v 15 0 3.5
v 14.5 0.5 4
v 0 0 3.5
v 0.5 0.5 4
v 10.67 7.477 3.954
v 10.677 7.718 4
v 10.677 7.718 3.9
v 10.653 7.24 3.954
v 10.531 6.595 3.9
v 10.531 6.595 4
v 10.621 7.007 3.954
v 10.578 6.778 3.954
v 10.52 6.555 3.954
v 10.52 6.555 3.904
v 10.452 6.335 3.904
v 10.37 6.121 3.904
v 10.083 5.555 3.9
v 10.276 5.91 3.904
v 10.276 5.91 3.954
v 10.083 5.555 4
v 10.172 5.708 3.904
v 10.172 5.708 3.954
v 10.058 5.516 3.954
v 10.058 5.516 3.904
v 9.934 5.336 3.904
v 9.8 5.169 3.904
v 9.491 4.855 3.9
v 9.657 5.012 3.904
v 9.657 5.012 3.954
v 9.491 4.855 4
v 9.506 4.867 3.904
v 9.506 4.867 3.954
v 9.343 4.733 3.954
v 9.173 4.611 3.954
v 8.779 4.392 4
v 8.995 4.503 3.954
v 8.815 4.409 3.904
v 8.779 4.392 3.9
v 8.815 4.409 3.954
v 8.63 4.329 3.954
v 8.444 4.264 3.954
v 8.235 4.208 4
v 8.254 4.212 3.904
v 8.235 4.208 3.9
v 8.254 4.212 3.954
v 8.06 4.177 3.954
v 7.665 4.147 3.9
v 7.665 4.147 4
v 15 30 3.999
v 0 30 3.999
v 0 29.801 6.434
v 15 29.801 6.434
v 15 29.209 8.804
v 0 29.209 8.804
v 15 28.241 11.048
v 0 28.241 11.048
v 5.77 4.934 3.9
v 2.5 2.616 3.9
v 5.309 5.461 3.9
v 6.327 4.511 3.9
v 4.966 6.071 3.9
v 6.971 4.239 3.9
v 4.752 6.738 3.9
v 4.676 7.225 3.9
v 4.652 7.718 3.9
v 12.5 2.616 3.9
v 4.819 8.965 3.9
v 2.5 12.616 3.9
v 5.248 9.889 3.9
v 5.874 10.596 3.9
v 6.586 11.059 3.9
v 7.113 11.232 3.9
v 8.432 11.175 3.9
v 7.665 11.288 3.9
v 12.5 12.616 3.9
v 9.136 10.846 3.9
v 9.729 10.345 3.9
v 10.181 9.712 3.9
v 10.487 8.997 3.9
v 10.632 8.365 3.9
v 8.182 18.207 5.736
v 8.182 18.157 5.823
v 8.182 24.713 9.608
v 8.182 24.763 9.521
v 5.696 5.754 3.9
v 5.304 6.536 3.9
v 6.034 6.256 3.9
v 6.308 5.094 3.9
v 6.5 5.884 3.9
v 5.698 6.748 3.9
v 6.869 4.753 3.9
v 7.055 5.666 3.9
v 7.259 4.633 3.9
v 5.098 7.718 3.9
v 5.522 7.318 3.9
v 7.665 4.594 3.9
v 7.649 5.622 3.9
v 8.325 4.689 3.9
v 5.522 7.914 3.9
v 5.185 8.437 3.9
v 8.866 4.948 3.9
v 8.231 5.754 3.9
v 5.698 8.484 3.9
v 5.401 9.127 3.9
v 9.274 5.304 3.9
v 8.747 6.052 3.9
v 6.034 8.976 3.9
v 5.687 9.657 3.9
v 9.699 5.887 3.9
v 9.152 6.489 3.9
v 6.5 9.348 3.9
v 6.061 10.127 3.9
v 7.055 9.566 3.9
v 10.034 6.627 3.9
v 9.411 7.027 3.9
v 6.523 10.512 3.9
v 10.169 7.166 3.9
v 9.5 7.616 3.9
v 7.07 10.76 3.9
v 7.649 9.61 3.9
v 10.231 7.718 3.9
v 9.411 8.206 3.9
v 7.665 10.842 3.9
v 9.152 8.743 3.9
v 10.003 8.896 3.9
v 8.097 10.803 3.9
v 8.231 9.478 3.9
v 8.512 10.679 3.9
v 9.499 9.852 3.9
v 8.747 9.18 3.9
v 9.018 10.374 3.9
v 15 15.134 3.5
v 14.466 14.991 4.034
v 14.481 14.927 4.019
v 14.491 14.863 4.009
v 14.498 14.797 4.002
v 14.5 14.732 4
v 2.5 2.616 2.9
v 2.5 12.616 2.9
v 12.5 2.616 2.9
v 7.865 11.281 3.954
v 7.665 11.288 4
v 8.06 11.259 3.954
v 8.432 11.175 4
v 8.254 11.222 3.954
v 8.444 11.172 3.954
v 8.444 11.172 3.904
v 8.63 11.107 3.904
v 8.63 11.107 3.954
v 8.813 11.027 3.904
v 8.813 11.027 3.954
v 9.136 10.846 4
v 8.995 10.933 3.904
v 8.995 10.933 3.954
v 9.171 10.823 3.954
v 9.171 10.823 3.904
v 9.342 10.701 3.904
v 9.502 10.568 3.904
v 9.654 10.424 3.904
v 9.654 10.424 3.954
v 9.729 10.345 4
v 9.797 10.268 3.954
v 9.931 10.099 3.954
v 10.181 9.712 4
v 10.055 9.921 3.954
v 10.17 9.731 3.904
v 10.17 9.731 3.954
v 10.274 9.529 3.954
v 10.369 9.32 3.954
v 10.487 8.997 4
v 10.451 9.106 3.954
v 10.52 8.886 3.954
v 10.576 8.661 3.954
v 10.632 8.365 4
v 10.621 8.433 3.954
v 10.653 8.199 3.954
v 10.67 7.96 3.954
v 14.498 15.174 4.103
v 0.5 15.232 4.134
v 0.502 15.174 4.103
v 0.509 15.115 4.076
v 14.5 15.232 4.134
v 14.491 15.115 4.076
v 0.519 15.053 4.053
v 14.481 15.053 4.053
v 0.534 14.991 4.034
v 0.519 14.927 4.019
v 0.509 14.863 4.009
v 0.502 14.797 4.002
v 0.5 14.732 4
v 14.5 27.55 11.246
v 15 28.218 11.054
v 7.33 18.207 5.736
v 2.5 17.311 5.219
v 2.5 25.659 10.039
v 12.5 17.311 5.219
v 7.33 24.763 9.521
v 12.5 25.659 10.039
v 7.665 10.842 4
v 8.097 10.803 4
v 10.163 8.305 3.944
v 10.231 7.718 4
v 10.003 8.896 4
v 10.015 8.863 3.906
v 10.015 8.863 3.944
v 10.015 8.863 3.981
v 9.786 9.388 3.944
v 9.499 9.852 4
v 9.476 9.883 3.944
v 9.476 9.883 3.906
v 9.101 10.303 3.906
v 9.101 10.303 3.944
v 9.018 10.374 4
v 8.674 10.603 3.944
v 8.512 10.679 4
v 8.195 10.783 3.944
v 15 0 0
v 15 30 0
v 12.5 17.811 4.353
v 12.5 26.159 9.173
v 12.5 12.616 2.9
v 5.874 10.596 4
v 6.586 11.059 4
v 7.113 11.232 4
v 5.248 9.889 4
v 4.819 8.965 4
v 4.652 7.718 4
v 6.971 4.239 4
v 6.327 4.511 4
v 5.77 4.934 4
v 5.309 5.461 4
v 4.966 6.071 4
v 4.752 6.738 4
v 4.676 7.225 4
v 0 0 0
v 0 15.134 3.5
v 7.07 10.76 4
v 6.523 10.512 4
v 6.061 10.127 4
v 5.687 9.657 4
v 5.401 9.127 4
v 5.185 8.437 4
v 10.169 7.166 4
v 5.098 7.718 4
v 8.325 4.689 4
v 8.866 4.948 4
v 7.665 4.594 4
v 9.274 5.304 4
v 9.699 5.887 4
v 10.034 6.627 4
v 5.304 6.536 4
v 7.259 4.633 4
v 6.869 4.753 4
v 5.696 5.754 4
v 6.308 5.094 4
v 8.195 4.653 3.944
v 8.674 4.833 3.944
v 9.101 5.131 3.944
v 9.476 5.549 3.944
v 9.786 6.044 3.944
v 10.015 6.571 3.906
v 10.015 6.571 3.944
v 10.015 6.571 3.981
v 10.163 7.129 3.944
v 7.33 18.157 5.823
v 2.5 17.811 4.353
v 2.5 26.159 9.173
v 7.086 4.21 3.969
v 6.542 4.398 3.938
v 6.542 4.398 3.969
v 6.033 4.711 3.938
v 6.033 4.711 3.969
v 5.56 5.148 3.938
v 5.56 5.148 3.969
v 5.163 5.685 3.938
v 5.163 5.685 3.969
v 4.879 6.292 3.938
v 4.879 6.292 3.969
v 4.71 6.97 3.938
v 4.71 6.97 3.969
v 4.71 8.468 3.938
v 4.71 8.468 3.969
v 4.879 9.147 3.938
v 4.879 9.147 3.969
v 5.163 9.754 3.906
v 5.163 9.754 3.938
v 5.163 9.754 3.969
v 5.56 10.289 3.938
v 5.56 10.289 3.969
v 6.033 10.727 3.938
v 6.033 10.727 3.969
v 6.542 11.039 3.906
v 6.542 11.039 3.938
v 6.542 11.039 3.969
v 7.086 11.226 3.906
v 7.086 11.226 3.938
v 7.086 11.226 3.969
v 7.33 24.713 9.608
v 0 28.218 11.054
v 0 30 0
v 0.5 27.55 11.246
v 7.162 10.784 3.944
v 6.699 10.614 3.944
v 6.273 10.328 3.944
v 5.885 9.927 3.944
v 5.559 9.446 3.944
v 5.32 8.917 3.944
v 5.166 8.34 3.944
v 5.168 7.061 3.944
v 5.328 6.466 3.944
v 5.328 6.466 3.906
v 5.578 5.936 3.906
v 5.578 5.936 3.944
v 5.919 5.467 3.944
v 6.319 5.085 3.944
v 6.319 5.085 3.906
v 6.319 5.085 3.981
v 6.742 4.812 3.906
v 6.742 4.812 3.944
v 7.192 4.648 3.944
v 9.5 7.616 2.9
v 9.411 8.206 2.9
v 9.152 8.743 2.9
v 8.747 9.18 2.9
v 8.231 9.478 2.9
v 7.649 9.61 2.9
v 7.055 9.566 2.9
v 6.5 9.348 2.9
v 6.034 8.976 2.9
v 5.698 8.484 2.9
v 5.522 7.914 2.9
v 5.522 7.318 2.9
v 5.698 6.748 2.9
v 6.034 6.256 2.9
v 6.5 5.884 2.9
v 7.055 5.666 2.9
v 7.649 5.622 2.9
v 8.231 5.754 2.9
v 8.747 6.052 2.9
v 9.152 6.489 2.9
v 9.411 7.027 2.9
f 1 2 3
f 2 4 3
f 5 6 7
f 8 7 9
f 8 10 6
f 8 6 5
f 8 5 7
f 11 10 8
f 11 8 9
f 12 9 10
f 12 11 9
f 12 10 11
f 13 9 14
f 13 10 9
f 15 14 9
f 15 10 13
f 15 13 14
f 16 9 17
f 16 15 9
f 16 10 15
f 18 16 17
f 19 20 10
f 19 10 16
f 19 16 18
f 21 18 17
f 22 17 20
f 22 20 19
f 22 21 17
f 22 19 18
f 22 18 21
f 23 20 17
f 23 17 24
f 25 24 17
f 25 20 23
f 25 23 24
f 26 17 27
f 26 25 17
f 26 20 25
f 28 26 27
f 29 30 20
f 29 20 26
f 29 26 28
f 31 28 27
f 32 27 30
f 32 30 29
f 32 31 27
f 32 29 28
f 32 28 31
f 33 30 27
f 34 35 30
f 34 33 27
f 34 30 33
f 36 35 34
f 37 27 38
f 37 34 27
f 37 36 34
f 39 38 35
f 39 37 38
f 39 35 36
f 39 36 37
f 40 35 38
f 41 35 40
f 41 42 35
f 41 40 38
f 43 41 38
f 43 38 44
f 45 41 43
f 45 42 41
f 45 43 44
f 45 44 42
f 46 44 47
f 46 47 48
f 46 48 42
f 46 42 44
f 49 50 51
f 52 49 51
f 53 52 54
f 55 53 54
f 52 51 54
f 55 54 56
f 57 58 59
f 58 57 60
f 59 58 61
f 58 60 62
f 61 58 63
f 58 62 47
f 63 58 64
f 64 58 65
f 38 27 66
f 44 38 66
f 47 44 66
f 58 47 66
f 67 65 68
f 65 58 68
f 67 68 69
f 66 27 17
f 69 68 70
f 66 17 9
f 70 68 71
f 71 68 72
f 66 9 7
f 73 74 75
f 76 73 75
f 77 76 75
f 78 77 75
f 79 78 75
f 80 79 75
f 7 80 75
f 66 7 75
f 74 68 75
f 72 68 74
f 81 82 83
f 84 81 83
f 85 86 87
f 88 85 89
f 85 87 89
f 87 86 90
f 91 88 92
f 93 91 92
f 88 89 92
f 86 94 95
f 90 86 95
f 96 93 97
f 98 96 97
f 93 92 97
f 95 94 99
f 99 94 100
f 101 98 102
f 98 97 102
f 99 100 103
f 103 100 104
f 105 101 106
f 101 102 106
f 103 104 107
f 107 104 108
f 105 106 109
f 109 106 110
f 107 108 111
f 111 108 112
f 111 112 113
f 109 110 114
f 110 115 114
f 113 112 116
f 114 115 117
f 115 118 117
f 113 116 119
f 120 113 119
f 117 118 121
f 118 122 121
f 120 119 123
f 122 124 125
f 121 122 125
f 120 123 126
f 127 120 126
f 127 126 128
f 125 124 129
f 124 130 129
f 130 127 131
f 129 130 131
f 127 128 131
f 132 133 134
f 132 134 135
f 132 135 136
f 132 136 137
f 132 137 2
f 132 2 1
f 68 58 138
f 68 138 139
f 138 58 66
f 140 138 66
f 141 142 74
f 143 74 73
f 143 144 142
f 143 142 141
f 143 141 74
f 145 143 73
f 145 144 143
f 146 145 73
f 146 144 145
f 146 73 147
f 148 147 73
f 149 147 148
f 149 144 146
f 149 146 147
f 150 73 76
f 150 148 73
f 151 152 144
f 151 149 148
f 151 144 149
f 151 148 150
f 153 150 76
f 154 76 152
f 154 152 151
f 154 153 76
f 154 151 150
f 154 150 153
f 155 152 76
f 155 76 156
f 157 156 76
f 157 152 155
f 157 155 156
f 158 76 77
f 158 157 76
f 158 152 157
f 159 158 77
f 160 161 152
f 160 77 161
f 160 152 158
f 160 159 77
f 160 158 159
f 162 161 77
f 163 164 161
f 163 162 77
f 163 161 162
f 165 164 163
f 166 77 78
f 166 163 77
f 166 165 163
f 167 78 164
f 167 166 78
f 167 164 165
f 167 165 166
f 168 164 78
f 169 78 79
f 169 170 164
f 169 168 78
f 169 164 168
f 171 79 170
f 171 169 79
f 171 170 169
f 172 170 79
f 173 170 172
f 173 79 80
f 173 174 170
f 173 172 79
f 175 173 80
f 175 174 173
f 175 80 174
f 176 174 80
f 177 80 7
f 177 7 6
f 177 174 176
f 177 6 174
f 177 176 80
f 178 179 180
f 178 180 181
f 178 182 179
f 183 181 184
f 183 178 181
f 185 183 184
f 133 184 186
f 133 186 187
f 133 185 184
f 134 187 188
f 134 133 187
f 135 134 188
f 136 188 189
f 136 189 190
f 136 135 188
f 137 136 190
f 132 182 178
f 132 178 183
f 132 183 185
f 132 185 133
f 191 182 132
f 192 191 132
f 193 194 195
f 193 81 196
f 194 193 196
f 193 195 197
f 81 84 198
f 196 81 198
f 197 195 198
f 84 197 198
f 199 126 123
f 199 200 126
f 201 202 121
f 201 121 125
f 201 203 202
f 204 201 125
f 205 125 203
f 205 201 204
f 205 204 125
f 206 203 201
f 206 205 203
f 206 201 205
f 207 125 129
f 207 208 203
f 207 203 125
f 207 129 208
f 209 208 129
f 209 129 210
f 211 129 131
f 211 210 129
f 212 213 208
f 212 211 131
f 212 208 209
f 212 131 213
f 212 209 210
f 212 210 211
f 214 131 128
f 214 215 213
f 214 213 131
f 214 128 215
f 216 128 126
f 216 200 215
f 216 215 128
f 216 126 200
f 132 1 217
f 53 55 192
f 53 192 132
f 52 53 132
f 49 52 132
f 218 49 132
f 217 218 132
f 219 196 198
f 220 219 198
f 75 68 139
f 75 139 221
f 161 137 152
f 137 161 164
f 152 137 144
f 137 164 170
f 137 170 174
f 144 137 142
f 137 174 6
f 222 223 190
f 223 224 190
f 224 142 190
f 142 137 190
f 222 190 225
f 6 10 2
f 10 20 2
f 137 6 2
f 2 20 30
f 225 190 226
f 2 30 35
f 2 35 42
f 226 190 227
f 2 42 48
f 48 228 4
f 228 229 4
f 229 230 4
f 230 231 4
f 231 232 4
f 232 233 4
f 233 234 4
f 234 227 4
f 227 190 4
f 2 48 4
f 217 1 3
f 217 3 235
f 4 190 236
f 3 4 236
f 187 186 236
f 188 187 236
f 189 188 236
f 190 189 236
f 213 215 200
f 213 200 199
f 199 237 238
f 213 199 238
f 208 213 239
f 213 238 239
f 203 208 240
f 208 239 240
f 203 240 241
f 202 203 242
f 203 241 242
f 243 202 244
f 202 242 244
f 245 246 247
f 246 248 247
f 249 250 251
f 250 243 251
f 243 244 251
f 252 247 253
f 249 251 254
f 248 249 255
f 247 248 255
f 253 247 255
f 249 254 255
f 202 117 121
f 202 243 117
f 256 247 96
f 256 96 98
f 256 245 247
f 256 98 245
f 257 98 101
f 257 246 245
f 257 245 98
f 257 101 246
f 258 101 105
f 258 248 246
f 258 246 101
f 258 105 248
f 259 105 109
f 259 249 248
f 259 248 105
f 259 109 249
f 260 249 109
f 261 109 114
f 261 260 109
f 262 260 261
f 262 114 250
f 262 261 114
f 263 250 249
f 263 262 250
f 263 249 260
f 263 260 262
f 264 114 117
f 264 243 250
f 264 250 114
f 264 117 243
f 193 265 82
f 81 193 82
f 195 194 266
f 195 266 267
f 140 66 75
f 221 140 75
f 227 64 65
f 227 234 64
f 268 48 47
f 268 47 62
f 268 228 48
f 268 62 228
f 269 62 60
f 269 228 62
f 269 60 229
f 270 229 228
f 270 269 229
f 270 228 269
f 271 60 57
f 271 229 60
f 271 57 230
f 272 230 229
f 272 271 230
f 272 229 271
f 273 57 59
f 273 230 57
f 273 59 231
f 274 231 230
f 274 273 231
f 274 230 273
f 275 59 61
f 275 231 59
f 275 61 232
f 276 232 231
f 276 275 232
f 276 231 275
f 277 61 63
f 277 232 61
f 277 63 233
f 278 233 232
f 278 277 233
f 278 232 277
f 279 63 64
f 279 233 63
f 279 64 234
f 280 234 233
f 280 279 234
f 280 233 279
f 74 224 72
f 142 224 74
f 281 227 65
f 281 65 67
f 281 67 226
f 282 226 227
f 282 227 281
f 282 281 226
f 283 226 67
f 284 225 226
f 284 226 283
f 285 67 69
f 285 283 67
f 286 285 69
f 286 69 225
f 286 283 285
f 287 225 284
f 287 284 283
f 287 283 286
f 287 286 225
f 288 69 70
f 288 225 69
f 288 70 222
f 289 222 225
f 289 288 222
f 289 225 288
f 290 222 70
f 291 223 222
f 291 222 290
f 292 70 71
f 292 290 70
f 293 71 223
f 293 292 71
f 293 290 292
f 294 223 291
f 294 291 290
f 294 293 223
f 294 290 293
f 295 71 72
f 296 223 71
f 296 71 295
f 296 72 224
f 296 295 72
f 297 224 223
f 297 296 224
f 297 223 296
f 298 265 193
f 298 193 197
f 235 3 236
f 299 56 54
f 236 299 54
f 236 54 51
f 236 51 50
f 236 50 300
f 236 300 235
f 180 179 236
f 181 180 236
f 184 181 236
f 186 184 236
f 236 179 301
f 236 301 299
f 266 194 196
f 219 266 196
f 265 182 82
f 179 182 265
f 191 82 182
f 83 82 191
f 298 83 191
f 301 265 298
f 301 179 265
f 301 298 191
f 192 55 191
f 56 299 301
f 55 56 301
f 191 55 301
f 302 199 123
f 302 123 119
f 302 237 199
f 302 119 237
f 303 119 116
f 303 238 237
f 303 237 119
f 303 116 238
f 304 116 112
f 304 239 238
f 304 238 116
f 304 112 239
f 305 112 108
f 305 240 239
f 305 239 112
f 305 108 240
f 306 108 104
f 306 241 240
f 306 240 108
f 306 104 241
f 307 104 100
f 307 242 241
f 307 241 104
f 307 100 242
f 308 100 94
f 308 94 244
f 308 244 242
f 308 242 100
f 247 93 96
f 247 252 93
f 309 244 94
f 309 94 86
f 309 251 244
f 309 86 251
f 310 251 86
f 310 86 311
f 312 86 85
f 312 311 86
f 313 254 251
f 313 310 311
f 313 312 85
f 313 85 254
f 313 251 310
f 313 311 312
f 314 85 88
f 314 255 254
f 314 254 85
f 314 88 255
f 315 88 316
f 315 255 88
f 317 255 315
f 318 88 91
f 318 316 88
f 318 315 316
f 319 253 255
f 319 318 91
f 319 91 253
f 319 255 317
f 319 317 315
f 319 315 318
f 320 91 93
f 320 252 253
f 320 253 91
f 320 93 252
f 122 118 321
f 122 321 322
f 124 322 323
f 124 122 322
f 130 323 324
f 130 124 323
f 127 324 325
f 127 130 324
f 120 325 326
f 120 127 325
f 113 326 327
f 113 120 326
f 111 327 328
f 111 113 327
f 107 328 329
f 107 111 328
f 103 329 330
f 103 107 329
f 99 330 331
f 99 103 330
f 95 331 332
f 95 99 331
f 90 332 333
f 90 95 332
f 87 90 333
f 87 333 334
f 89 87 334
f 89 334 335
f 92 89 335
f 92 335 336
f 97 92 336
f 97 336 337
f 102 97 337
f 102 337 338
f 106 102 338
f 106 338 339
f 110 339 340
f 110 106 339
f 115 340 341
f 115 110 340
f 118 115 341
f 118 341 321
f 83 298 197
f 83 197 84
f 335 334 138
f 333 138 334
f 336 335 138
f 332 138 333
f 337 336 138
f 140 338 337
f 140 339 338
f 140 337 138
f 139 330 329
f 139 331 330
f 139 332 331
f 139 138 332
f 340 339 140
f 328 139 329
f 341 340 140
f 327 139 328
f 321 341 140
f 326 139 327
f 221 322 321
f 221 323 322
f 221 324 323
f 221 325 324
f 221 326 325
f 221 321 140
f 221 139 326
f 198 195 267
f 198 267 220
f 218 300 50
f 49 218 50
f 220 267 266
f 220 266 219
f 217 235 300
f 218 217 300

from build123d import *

# Parameters (mm, degrees)
RESSALTO_EXTRUS_O1_DEPTH = 15
FILETE1_R                = 1
CORTE_EXTRUS_O1_DEPTH    = 0.1
ESBO_O2_W                = 0.851600406
ESBO_O2_H                = 7.569781387
CORTE_EXTRUS_O2_DEPTH    = 0.1
ESBO_O5_W                = 10
ESBO_O5_H                = 9.639509302
CORTE_EXTRUS_O3_DEPTH    = 1
ESBO_O7_W                = 10
ESBO_O7_H                = 10
ESBO_O7_R                = 2
CORTE_EXTRUS_O4_DEPTH    = 1


with BuildPart() as part:
    # Esboço1 → Ressalto-extrusão1 (new body)
    with BuildSketch(Plane(origin=(0, 0, 0), x_dir=(0, 0, -1), z_dir=(1, 0, 0))):
        with BuildLine():
            Line((0, 0), (0, 30.000000051))
            Line((0, 30.000000051), (-3.998768252, 30.000000051))
            ThreePointArc((-3.998768252, 30.000000051), (-7.881698136, 29.488790089), (-11.5, 27.99))
            Line((-11.5, 27.99), (-4, 15))
            Line((-4, 15), (-4, 0))
            Line((-4, 0), (0, 0))
        make_face()
    extrude(amount=RESSALTO_EXTRUS_O1_DEPTH)

    # Chanfro1
    # the kernel refuses this chamfer: 0.5 mm, written as the material it takes off along each edge
    with BuildSketch(Plane(origin=(-1.285841494, 0, 4), x_dir=(0, 0.9996219169112968, 0.02749587661058563), z_dir=(1, 0, 0))) as chanfro1_piece_1:
        with BuildLine():
            Line((0.514336598, 0), (-0.028273577, -0.513558897))
            Line((-0.028273577, -0.513558897), (-0.038269797, -0.513283938))
            ThreePointArc((-0.038269797, -0.513283938), (-0.017064614, -0.256698915), (-0.009996219, 0.000274959))
            Line((-0.009996219, 0.000274959), (0.000274959, 0.009996219))
            ThreePointArc((0.000274959, 0.009996219), (0.257248832, 0.002927825), (0.514611556, 0.009996219))
            Line((0.514611556, 0.009996219), (0.514336598, 0))
        make_face()
    extrude(amount=17.571682988, mode=Mode.SUBTRACT)
    with BuildSketch(Plane(origin=(-1.329115007, 27.99, 11.5), x_dir=(0, 0.5080962440375398, -0.8613003000086236), z_dir=(1, 0, 0))) as chanfro1_piece_2:
        with BuildLine():
            Line((0.531646003, 0), (-0.019274737, -0.522360638))
            Line((-0.019274737, -0.522360638), (-0.029274299, -0.522267024))
            ThreePointArc((-0.029274299, -0.522267024), (-0.012445314, -0.261154032), (-0.009999562, 9.3614e-05))
            Line((-0.009999562, 9.3614e-05), (9.3614e-05, 0.009999562))
            ThreePointArc((9.3614e-05, 0.009999562), (0.265962617, 0.005155355), (0.532084323, 0.009990389))
            Line((0.532084323, 0.009990389), (0.531646003, 0))
        make_face()
    extrude(amount=17.658230014, mode=Mode.SUBTRACT)
    with BuildSketch(Plane(origin=(15, 29.103563232, 12.142934892), x_dir=(-0.9996219169112968, -0.01374824076991902, 0.023811953013499736), z_dir=(0, -0.866019052628739, -0.5000110003630134))) as chanfro1_piece_3_section:
        with BuildLine():
            Line((0.514336598, 0), (-0.028273577, 0.513558897))
            Line((-0.028273577, 0.513558897), (-0.038269797, 0.513283938))
            ThreePointArc((-0.038269797, 0.513283938), (-0.017064614, 0.256698915), (-0.009996219, -0.000274959))
            Line((-0.009996219, -0.000274959), (0.000274959, -0.009996219))
            ThreePointArc((0.000274959, -0.009996219), (0.257248832, -0.002927825), (0.514611556, -0.009996219))
            Line((0.514611556, -0.009996219), (0.514336598, 0))
        make_face()
    chanfro1_piece_3 = extrude(amount=17.571352984, mode=Mode.PRIVATE)
    chanfro1_piece_3 = split(chanfro1_piece_3, bisect_by=Plane(origin=(14.834184444, 22.255751757, 4), z_dir=(0, 0, 1)), keep=Keep.TOP, mode=Mode.PRIVATE)
    add(chanfro1_piece_3, mode=Mode.SUBTRACT)
    with BuildSketch(Plane(origin=(15, 16.285841494, 4), x_dir=(-0.9996219169112968, 0, 0.027495876610585647), z_dir=(0, -1, 0))) as chanfro1_piece_4_section:
        with BuildLine():
            Line((0.514336598, 0), (-0.028273577, 0.513558897))
            Line((-0.028273577, 0.513558897), (-0.038269797, 0.513283938))
            ThreePointArc((-0.038269797, 0.513283938), (-0.017064614, 0.256698915), (-0.009996219, -0.000274959))
            Line((-0.009996219, -0.000274959), (0.000274959, -0.009996219))
            ThreePointArc((0.000274959, -0.009996219), (0.257248832, -0.002927825), (0.514611556, -0.009996219))
            Line((0.514611556, -0.009996219), (0.514336598, 0))
        make_face()
    chanfro1_piece_4 = extrude(amount=17.571682988, mode=Mode.PRIVATE)
    chanfro1_piece_4 = split(chanfro1_piece_4, bisect_by=Plane(origin=(14.834184463, 8.71625695, 0.371972835), z_dir=(0, -0.5000110003630134, 0.866019052628739)), keep=Keep.TOP, mode=Mode.PRIVATE)
    add(chanfro1_piece_4, mode=Mode.SUBTRACT)
    with BuildSketch(Plane(origin=(0, 16.285841494, 4), x_dir=(0.9996219169112968, 0, 0.02749587661058563), z_dir=(0, -1, 0))) as chanfro1_piece_5_section:
        with BuildLine():
            Line((0.514336598, 0), (-0.028273577, -0.513558897))
            Line((-0.028273577, -0.513558897), (-0.038269797, -0.513283938))
            ThreePointArc((-0.038269797, -0.513283938), (-0.017064614, -0.256698915), (-0.009996219, 0.000274959))
            Line((-0.009996219, 0.000274959), (0.000274959, 0.009996219))
            ThreePointArc((0.000274959, 0.009996219), (0.257248832, 0.002927825), (0.514611556, 0.009996219))
            Line((0.514611556, 0.009996219), (0.514336598, 0))
        make_face()
    chanfro1_piece_5 = extrude(amount=17.571682988, mode=Mode.PRIVATE)
    chanfro1_piece_5 = split(chanfro1_piece_5, bisect_by=Plane(origin=(0.165815537, 8.71625695, 0.371972835), z_dir=(0, -0.5000110003630134, 0.866019052628739)), keep=Keep.TOP, mode=Mode.PRIVATE)
    add(chanfro1_piece_5, mode=Mode.SUBTRACT)
    with BuildSketch(Plane(origin=(0, 29.103563232, 12.142934892), x_dir=(0.9996219169112968, -0.01374824076991901, 0.023811953013499722), z_dir=(0, -0.866019052628739, -0.5000110003630134))) as chanfro1_piece_6_section:
        with BuildLine():
            Line((0.514336598, 0), (-0.028273577, -0.513558897))
            Line((-0.028273577, -0.513558897), (-0.038269797, -0.513283938))
            ThreePointArc((-0.038269797, -0.513283938), (-0.017064614, -0.256698915), (-0.009996219, 0.000274959))
            Line((-0.009996219, 0.000274959), (0.000274959, 0.009996219))
            ThreePointArc((0.000274959, 0.009996219), (0.257248832, 0.002927825), (0.514611556, 0.009996219))
            Line((0.514611556, 0.009996219), (0.514336598, 0))
        make_face()
    chanfro1_piece_6 = extrude(amount=17.571352984, mode=Mode.PRIVATE)
    chanfro1_piece_6 = split(chanfro1_piece_6, bisect_by=Plane(origin=(0.165815556, 22.255751757, 4), z_dir=(0, 0, 1)), keep=Keep.TOP, mode=Mode.PRIVATE)
    add(chanfro1_piece_6, mode=Mode.SUBTRACT)
    with BuildSketch(Plane(origin=(15, 29.103563232, 12.142934892), x_dir=(-0.9996219169112968, -0.01374824076991902, 0.023811953013499736), z_dir=(0, -0.866019052628739, -0.5000110003630134))) as chanfro1_piece_7a_section:
        with BuildLine():
            Line((0.514336598, 0), (-0.028273577, 0.513558897))
            Line((-0.028273577, 0.513558897), (-0.038269797, 0.513283938))
            ThreePointArc((-0.038269797, 0.513283938), (-0.017064614, 0.256698915), (-0.009996219, -0.000274959))
            Line((-0.009996219, -0.000274959), (0.000274959, -0.009996219))
            ThreePointArc((0.000274959, -0.009996219), (0.257248832, -0.002927825), (0.514611556, -0.009996219))
            Line((0.514611556, -0.009996219), (0.514336598, 0))
        make_face()
    chanfro1_piece_7a = extrude(amount=17.571352984, mode=Mode.PRIVATE)
    chanfro1_piece_7a = split(chanfro1_piece_7a, bisect_by=Plane(origin=(14.844457521, 14.67120849, 4), z_dir=(0, 0, -1)), keep=Keep.TOP, mode=Mode.PRIVATE)
    with BuildSketch(Plane(origin=(15, 16.285841494, 4), x_dir=(-0.9996219169112968, 0, 0.027495876610585647), z_dir=(0, -1, 0))) as chanfro1_piece_7b_section:
        with BuildLine():
            Line((0.514336598, 0), (-0.028273577, 0.513558897))
            Line((-0.028273577, 0.513558897), (-0.038269797, 0.513283938))
            ThreePointArc((-0.038269797, 0.513283938), (-0.017064614, 0.256698915), (-0.009996219, -0.000274959))
            Line((-0.009996219, -0.000274959), (0.000274959, -0.009996219))
            ThreePointArc((0.000274959, -0.009996219), (0.257248832, -0.002927825), (0.514611556, -0.009996219))
            Line((0.514611556, -0.009996219), (0.514336598, 0))
        make_face()
    chanfro1_piece_7b = extrude(amount=17.571682988, mode=Mode.PRIVATE)
    chanfro1_piece_7b = split(chanfro1_piece_7b, bisect_by=Plane(origin=(14.844457521, 15.284739712, 4.164399372), z_dir=(0, 0.5000110003630134, -0.866019052628739)), keep=Keep.TOP, mode=Mode.PRIVATE)
    chanfro1_piece_7 = chanfro1_piece_7a & chanfro1_piece_7b
    add(chanfro1_piece_7, mode=Mode.SUBTRACT)
    with BuildSketch(Plane(origin=(0, 29.103563232, 12.142934892), x_dir=(0.9996219169112968, -0.01374824076991901, 0.023811953013499722), z_dir=(0, -0.866019052628739, -0.5000110003630134))) as chanfro1_piece_8a_section:
        with BuildLine():
            Line((0.514336598, 0), (-0.028273577, -0.513558897))
            Line((-0.028273577, -0.513558897), (-0.038269797, -0.513283938))
            ThreePointArc((-0.038269797, -0.513283938), (-0.017064614, -0.256698915), (-0.009996219, 0.000274959))
            Line((-0.009996219, 0.000274959), (0.000274959, 0.009996219))
            ThreePointArc((0.000274959, 0.009996219), (0.257248832, 0.002927825), (0.514611556, 0.009996219))
            Line((0.514611556, 0.009996219), (0.514336598, 0))
        make_face()
    chanfro1_piece_8a = extrude(amount=17.571352984, mode=Mode.PRIVATE)
    chanfro1_piece_8a = split(chanfro1_piece_8a, bisect_by=Plane(origin=(0.155542479, 14.67120849, 4), z_dir=(0, 0, -1)), keep=Keep.TOP, mode=Mode.PRIVATE)
    with BuildSketch(Plane(origin=(0, 16.285841494, 4), x_dir=(0.9996219169112968, 0, 0.02749587661058563), z_dir=(0, -1, 0))) as chanfro1_piece_8b_section:
        with BuildLine():
            Line((0.514336598, 0), (-0.028273577, -0.513558897))
            Line((-0.028273577, -0.513558897), (-0.038269797, -0.513283938))
            ThreePointArc((-0.038269797, -0.513283938), (-0.017064614, -0.256698915), (-0.009996219, 0.000274959))
            Line((-0.009996219, 0.000274959), (0.000274959, 0.009996219))
            ThreePointArc((0.000274959, 0.009996219), (0.257248832, 0.002927825), (0.514611556, 0.009996219))
            Line((0.514611556, 0.009996219), (0.514336598, 0))
        make_face()
    chanfro1_piece_8b = extrude(amount=17.571682988, mode=Mode.PRIVATE)
    chanfro1_piece_8b = split(chanfro1_piece_8b, bisect_by=Plane(origin=(0.155542479, 15.284739712, 4.164399372), z_dir=(0, 0.5000110003630134, -0.866019052628739)), keep=Keep.TOP, mode=Mode.PRIVATE)
    chanfro1_piece_8 = chanfro1_piece_8a & chanfro1_piece_8b
    add(chanfro1_piece_8, mode=Mode.SUBTRACT)

    # Filete1
    filete1_edges = [part.edges().sort_by_distance(p)[0] for p in [
        (7.5, 15, 4),
    ]]
    fillet(filete1_edges, radius=FILETE1_R)

    # Esboço4 → Corte-extrusão1 (cut)
    with BuildSketch(Plane.XY.offset(4)):
        with BuildLine():
            add(Edge.make_bspline(
                [(10.677142464, 7.717861332), (10.675491893, 7.637643685), (10.672210966, 7.478190821), (10.65538923, 7.240566988), (10.623347331, 7.007332743), (10.580757754, 6.778196585), (10.521530651, 6.554832351), (10.455078991, 6.334528983), (10.371798484, 6.119765454), (10.278769369, 5.909951206), (10.174027491, 5.708256453), (10.061344868, 5.515853133), (9.937368217, 5.335686475), (9.802255278, 5.168293604), (9.659731297, 5.01096062), (9.506991195, 4.86540107), (9.345090035, 4.731371027), (9.174636706, 4.609171357), (8.99727128, 4.502252193), (8.816718527, 4.406838826), (8.632656274, 4.326585067), (8.444451996, 4.262773798), (8.254802385, 4.208290712), (8.060527696, 4.175816019), (7.863974081, 4.150598415), (7.731489385, 4.148479207), (7.66457316, 4.147408823)],
                knots=[0, 0, 0, 0, 1.112232891, 2.210844172, 3.300081163, 4.374499544, 5.439422096, 6.502026147, 7.562826816, 8.630306062, 9.682444482, 10.711789295, 11.719628984, 12.711074663, 13.691957169, 14.660655153, 15.63336488, 16.603602659, 17.565239823, 18.502160713, 19.433070182, 20.345174306, 21.255961054, 22.164607458, 23.072968101, 24, 24, 24, 24], degree=3))
            add(Edge.make_bspline(
                [(7.66457316, 4.147408823), (7.566159877, 4.150307832), (7.371670031, 4.156037015), (7.084636065, 4.205404923), (6.806491624, 4.283026108), (6.538010436, 4.395344378), (6.276421328, 4.534056052), (6.027137985, 4.709336817), (5.784699559, 4.912539502), (5.555454058, 5.146167763), (5.343776563, 5.403908656), (5.157616094, 5.681951296), (5.002598461, 5.979084138), (4.872469059, 6.291817419), (4.772595359, 6.623614607), (4.705040321, 6.973040142), (4.658837633, 7.339482543), (4.654315579, 7.589863759), (4.652003856, 7.717861332)],
                knots=[0, 0, 0, 0, 0.909166022, 1.796744864, 2.684453754, 3.573332222, 4.481847292, 5.41618573, 6.384649117, 7.402709214, 8.437233447, 9.463804637, 10.489883747, 11.530416076, 12.590906446, 13.686597692, 14.817363838, 16, 16, 16, 16], degree=3))
            add(Edge.make_bspline(
                [(4.652003856, 7.717861332), (4.654351194, 7.845854009), (4.658953504, 8.096802954), (4.704817807, 8.463881899), (4.772914354, 8.814337975), (4.87210068, 9.14692119), (5.002625371, 9.460122794), (5.15765814, 9.757226091), (5.343330676, 10.035058039), (5.555341937, 10.291548896), (5.785957778, 10.522899205), (6.025814065, 10.728757772), (6.277655638, 10.900792935), (6.536977624, 11.04308332), (6.807016281, 11.152058947), (7.084552761, 11.230503451), (7.371691448, 11.279637905), (7.566167073, 11.285398791), (7.66457316, 11.288313841)],
                knots=[0, 0, 0, 0, 1.182381368, 2.318236969, 3.413692153, 4.479097322, 5.519405472, 6.545263518, 7.571613538, 8.601764894, 9.615786618, 10.587505976, 11.518596411, 12.429468701, 13.316124599, 14.203642237, 15.091029854, 16, 16, 16, 16], degree=3))
            add(Edge.make_bspline(
                [(7.66457316, 11.288313841), (7.731476328, 11.287178127), (7.863935174, 11.284929573), (8.060784597, 11.260654251), (8.254288991, 11.224560055), (8.444743052, 11.173569163), (8.632270949, 11.10946206), (8.815579819, 11.027802727), (8.997268221, 10.934862635), (9.172559362, 10.823879659), (9.342745146, 10.703232049), (9.504230646, 10.569868351), (9.655534501, 10.424703596), (9.799997583, 10.26906524), (9.932820526, 10.100361538), (10.057671679, 9.921236268), (10.17310707, 9.731183126), (10.276316989, 9.529507568), (10.370760826, 9.320894644), (10.452496074, 9.105983505), (10.523117676, 8.886297831), (10.577425263, 8.660954579), (10.624198013, 8.432173987), (10.655261664, 8.19801895), (10.672253355, 7.959284368), (10.67550612, 7.798663607), (10.677142464, 7.717861332)],
                knots=[0, 0, 0, 0, 0.927239978, 1.835804509, 2.746118307, 3.655004384, 4.567313236, 5.491045181, 6.435320531, 7.394537119, 8.364992675, 9.326575615, 10.29549103, 11.270652298, 12.268619163, 13.270060955, 14.296858096, 15.349232675, 16.409598064, 17.470636838, 18.535889856, 19.606887649, 20.683086841, 21.772568318, 22.879462736, 24, 24, 24, 24], degree=3))
        make_face()
        with BuildLine():
            add(Edge.make_bspline(
                [(10.230835901, 7.717861332), (10.224149096, 7.817384754), (10.210919696, 8.014285252), (10.165889121, 8.304818145), (10.10440883, 8.588623605), (10.017942552, 8.863782701), (9.913350657, 9.131294998), (9.789000181, 9.390824574), (9.643558179, 9.642358317), (9.480297946, 9.883811377), (9.30130714, 10.107636689), (9.107673193, 10.305382764), (8.897902322, 10.469683372), (8.677640595, 10.608267408), (8.441803115, 10.712677065), (8.194402778, 10.788602114), (7.933446805, 10.8325239), (7.755391648, 10.838804041), (7.66457316, 10.842007278)],
                knots=[0, 0, 0, 0, 1.072945641, 2.122751872, 3.160550073, 4.195045731, 5.222790319, 6.249316523, 7.288715031, 8.346758945, 9.38299211, 10.369101689, 11.317447082, 12.244164047, 13.162316996, 14.084168162, 15.022814312, 16, 16, 16, 16], degree=3))
            add(Edge.make_bspline(
                [(7.66457316, 10.842007278), (7.578951813, 10.839565255), (7.41004619, 10.834747864), (7.162474672, 10.789306497), (6.924593315, 10.717031705), (6.694989062, 10.617864996), (6.476268571, 10.487219539), (6.267009132, 10.328746298), (6.068400439, 10.140665945), (5.879956973, 9.927744423), (5.707589059, 9.694780855), (5.555074142, 9.447371831), (5.423463422, 9.188842243), (5.315600507, 8.917151559), (5.228087427, 8.633834871), (5.162607375, 8.33878598), (5.115565833, 8.032436858), (5.104121062, 7.823792485), (5.098310419, 7.717861332)],
                knots=[0, 0, 0, 0, 0.920751586, 1.816370871, 2.698790093, 3.592310473, 4.500830444, 5.433988683, 6.411851609, 7.439738322, 8.490489621, 9.526714784, 10.564429984, 11.608533727, 12.668901603, 13.752279013, 14.858806142, 16, 16, 16, 16], degree=3))
            add(Edge.make_bspline(
                [(5.098310419, 7.717861332), (5.103916197, 7.605518764), (5.114911362, 7.385170178), (5.164224192, 7.063834288), (5.230261511, 6.757014391), (5.324040601, 6.467168505), (5.436465785, 6.1922159), (5.573699539, 5.933493099), (5.734734435, 5.691483653), (5.91436711, 5.465608967), (6.110780968, 5.264158888), (6.312570348, 5.084090072), (6.52307409, 4.933987063), (6.738199671, 4.808252439), (6.961169517, 4.711541801), (7.190613348, 4.643440575), (7.42598174, 4.602087566), (7.584795851, 4.596514775), (7.66457316, 4.593715387)],
                knots=[0, 0, 0, 0, 1.210157347, 2.373601246, 3.495271046, 4.585425916, 5.648479198, 6.689565086, 7.732378856, 8.773896982, 9.791503928, 10.757859102, 11.68147193, 12.569965943, 13.435793289, 14.290886071, 15.141458466, 16, 16, 16, 16], degree=3))
            add(Edge.make_bspline(
                [(7.66457316, 4.593715387), (7.755393406, 4.596915746), (7.93345201, 4.603190245), (8.19438306, 4.647152826), (8.441875555, 4.722927027), (8.677091244, 4.82777369), (8.898422511, 4.964014542), (9.107660587, 5.12867529), (9.300729799, 5.326210469), (9.480871416, 5.54854368), (9.643490833, 5.789938842), (9.788953577, 6.04141911), (9.913834466, 6.301339386), (10.017157537, 6.569308064), (10.105052944, 6.844589634), (10.165784446, 7.129206023), (10.210834308, 7.420864495), (10.224133398, 7.618338151), (10.230835901, 7.717861332)],
                knots=[0, 0, 0, 0, 0.976941104, 1.915352318, 2.83697275, 3.754895891, 4.678105416, 5.626213443, 6.612076206, 7.643190205, 8.700969298, 9.740107651, 10.766376922, 11.799687281, 12.827954204, 13.8715967, 14.92732291, 16, 16, 16, 16], degree=3))
        make_face(mode=Mode.SUBTRACT)
    extrude(amount=-CORTE_EXTRUS_O1_DEPTH, mode=Mode.SUBTRACT)

    # Esboço2 → Corte-extrusão2 (cut)
    with BuildSketch(Plane(origin=(0, 2.018088796, -3.495329795), x_dir=(1, 0, 0), z_dir=(0, -0.5000110003630135, 0.866019052628739))):
        with Locations((7.75602892, 22.420928057)):
            Rectangle(ESBO_O2_W, ESBO_O2_H)
    extrude(amount=-CORTE_EXTRUS_O2_DEPTH, mode=Mode.SUBTRACT)

    # Esboço5 → Corte-extrusão3 (cut)
    with BuildSketch(Plane(origin=(0, 2.068089896, -3.5819317), x_dir=(1, 0, 0), z_dir=(0, -0.5000110003630135, 0.866019052628739))):
        with Locations((7.5, 22.420928056)):
            Rectangle(ESBO_O5_W, ESBO_O5_H)
    extrude(amount=-CORTE_EXTRUS_O3_DEPTH, mode=Mode.SUBTRACT)

    # Esboço7 → Corte-extrusão4 (cut)
    with BuildSketch(Plane.XY.offset(3.9)):
        with Locations((7.5, 7.616022)):
            Rectangle(ESBO_O7_W, ESBO_O7_H)
        with Locations((7.5, 7.616022)):
            Circle(ESBO_O7_R, mode=Mode.SUBTRACT)
    extrude(amount=-CORTE_EXTRUS_O4_DEPTH, mode=Mode.SUBTRACT)


solid = part.part
